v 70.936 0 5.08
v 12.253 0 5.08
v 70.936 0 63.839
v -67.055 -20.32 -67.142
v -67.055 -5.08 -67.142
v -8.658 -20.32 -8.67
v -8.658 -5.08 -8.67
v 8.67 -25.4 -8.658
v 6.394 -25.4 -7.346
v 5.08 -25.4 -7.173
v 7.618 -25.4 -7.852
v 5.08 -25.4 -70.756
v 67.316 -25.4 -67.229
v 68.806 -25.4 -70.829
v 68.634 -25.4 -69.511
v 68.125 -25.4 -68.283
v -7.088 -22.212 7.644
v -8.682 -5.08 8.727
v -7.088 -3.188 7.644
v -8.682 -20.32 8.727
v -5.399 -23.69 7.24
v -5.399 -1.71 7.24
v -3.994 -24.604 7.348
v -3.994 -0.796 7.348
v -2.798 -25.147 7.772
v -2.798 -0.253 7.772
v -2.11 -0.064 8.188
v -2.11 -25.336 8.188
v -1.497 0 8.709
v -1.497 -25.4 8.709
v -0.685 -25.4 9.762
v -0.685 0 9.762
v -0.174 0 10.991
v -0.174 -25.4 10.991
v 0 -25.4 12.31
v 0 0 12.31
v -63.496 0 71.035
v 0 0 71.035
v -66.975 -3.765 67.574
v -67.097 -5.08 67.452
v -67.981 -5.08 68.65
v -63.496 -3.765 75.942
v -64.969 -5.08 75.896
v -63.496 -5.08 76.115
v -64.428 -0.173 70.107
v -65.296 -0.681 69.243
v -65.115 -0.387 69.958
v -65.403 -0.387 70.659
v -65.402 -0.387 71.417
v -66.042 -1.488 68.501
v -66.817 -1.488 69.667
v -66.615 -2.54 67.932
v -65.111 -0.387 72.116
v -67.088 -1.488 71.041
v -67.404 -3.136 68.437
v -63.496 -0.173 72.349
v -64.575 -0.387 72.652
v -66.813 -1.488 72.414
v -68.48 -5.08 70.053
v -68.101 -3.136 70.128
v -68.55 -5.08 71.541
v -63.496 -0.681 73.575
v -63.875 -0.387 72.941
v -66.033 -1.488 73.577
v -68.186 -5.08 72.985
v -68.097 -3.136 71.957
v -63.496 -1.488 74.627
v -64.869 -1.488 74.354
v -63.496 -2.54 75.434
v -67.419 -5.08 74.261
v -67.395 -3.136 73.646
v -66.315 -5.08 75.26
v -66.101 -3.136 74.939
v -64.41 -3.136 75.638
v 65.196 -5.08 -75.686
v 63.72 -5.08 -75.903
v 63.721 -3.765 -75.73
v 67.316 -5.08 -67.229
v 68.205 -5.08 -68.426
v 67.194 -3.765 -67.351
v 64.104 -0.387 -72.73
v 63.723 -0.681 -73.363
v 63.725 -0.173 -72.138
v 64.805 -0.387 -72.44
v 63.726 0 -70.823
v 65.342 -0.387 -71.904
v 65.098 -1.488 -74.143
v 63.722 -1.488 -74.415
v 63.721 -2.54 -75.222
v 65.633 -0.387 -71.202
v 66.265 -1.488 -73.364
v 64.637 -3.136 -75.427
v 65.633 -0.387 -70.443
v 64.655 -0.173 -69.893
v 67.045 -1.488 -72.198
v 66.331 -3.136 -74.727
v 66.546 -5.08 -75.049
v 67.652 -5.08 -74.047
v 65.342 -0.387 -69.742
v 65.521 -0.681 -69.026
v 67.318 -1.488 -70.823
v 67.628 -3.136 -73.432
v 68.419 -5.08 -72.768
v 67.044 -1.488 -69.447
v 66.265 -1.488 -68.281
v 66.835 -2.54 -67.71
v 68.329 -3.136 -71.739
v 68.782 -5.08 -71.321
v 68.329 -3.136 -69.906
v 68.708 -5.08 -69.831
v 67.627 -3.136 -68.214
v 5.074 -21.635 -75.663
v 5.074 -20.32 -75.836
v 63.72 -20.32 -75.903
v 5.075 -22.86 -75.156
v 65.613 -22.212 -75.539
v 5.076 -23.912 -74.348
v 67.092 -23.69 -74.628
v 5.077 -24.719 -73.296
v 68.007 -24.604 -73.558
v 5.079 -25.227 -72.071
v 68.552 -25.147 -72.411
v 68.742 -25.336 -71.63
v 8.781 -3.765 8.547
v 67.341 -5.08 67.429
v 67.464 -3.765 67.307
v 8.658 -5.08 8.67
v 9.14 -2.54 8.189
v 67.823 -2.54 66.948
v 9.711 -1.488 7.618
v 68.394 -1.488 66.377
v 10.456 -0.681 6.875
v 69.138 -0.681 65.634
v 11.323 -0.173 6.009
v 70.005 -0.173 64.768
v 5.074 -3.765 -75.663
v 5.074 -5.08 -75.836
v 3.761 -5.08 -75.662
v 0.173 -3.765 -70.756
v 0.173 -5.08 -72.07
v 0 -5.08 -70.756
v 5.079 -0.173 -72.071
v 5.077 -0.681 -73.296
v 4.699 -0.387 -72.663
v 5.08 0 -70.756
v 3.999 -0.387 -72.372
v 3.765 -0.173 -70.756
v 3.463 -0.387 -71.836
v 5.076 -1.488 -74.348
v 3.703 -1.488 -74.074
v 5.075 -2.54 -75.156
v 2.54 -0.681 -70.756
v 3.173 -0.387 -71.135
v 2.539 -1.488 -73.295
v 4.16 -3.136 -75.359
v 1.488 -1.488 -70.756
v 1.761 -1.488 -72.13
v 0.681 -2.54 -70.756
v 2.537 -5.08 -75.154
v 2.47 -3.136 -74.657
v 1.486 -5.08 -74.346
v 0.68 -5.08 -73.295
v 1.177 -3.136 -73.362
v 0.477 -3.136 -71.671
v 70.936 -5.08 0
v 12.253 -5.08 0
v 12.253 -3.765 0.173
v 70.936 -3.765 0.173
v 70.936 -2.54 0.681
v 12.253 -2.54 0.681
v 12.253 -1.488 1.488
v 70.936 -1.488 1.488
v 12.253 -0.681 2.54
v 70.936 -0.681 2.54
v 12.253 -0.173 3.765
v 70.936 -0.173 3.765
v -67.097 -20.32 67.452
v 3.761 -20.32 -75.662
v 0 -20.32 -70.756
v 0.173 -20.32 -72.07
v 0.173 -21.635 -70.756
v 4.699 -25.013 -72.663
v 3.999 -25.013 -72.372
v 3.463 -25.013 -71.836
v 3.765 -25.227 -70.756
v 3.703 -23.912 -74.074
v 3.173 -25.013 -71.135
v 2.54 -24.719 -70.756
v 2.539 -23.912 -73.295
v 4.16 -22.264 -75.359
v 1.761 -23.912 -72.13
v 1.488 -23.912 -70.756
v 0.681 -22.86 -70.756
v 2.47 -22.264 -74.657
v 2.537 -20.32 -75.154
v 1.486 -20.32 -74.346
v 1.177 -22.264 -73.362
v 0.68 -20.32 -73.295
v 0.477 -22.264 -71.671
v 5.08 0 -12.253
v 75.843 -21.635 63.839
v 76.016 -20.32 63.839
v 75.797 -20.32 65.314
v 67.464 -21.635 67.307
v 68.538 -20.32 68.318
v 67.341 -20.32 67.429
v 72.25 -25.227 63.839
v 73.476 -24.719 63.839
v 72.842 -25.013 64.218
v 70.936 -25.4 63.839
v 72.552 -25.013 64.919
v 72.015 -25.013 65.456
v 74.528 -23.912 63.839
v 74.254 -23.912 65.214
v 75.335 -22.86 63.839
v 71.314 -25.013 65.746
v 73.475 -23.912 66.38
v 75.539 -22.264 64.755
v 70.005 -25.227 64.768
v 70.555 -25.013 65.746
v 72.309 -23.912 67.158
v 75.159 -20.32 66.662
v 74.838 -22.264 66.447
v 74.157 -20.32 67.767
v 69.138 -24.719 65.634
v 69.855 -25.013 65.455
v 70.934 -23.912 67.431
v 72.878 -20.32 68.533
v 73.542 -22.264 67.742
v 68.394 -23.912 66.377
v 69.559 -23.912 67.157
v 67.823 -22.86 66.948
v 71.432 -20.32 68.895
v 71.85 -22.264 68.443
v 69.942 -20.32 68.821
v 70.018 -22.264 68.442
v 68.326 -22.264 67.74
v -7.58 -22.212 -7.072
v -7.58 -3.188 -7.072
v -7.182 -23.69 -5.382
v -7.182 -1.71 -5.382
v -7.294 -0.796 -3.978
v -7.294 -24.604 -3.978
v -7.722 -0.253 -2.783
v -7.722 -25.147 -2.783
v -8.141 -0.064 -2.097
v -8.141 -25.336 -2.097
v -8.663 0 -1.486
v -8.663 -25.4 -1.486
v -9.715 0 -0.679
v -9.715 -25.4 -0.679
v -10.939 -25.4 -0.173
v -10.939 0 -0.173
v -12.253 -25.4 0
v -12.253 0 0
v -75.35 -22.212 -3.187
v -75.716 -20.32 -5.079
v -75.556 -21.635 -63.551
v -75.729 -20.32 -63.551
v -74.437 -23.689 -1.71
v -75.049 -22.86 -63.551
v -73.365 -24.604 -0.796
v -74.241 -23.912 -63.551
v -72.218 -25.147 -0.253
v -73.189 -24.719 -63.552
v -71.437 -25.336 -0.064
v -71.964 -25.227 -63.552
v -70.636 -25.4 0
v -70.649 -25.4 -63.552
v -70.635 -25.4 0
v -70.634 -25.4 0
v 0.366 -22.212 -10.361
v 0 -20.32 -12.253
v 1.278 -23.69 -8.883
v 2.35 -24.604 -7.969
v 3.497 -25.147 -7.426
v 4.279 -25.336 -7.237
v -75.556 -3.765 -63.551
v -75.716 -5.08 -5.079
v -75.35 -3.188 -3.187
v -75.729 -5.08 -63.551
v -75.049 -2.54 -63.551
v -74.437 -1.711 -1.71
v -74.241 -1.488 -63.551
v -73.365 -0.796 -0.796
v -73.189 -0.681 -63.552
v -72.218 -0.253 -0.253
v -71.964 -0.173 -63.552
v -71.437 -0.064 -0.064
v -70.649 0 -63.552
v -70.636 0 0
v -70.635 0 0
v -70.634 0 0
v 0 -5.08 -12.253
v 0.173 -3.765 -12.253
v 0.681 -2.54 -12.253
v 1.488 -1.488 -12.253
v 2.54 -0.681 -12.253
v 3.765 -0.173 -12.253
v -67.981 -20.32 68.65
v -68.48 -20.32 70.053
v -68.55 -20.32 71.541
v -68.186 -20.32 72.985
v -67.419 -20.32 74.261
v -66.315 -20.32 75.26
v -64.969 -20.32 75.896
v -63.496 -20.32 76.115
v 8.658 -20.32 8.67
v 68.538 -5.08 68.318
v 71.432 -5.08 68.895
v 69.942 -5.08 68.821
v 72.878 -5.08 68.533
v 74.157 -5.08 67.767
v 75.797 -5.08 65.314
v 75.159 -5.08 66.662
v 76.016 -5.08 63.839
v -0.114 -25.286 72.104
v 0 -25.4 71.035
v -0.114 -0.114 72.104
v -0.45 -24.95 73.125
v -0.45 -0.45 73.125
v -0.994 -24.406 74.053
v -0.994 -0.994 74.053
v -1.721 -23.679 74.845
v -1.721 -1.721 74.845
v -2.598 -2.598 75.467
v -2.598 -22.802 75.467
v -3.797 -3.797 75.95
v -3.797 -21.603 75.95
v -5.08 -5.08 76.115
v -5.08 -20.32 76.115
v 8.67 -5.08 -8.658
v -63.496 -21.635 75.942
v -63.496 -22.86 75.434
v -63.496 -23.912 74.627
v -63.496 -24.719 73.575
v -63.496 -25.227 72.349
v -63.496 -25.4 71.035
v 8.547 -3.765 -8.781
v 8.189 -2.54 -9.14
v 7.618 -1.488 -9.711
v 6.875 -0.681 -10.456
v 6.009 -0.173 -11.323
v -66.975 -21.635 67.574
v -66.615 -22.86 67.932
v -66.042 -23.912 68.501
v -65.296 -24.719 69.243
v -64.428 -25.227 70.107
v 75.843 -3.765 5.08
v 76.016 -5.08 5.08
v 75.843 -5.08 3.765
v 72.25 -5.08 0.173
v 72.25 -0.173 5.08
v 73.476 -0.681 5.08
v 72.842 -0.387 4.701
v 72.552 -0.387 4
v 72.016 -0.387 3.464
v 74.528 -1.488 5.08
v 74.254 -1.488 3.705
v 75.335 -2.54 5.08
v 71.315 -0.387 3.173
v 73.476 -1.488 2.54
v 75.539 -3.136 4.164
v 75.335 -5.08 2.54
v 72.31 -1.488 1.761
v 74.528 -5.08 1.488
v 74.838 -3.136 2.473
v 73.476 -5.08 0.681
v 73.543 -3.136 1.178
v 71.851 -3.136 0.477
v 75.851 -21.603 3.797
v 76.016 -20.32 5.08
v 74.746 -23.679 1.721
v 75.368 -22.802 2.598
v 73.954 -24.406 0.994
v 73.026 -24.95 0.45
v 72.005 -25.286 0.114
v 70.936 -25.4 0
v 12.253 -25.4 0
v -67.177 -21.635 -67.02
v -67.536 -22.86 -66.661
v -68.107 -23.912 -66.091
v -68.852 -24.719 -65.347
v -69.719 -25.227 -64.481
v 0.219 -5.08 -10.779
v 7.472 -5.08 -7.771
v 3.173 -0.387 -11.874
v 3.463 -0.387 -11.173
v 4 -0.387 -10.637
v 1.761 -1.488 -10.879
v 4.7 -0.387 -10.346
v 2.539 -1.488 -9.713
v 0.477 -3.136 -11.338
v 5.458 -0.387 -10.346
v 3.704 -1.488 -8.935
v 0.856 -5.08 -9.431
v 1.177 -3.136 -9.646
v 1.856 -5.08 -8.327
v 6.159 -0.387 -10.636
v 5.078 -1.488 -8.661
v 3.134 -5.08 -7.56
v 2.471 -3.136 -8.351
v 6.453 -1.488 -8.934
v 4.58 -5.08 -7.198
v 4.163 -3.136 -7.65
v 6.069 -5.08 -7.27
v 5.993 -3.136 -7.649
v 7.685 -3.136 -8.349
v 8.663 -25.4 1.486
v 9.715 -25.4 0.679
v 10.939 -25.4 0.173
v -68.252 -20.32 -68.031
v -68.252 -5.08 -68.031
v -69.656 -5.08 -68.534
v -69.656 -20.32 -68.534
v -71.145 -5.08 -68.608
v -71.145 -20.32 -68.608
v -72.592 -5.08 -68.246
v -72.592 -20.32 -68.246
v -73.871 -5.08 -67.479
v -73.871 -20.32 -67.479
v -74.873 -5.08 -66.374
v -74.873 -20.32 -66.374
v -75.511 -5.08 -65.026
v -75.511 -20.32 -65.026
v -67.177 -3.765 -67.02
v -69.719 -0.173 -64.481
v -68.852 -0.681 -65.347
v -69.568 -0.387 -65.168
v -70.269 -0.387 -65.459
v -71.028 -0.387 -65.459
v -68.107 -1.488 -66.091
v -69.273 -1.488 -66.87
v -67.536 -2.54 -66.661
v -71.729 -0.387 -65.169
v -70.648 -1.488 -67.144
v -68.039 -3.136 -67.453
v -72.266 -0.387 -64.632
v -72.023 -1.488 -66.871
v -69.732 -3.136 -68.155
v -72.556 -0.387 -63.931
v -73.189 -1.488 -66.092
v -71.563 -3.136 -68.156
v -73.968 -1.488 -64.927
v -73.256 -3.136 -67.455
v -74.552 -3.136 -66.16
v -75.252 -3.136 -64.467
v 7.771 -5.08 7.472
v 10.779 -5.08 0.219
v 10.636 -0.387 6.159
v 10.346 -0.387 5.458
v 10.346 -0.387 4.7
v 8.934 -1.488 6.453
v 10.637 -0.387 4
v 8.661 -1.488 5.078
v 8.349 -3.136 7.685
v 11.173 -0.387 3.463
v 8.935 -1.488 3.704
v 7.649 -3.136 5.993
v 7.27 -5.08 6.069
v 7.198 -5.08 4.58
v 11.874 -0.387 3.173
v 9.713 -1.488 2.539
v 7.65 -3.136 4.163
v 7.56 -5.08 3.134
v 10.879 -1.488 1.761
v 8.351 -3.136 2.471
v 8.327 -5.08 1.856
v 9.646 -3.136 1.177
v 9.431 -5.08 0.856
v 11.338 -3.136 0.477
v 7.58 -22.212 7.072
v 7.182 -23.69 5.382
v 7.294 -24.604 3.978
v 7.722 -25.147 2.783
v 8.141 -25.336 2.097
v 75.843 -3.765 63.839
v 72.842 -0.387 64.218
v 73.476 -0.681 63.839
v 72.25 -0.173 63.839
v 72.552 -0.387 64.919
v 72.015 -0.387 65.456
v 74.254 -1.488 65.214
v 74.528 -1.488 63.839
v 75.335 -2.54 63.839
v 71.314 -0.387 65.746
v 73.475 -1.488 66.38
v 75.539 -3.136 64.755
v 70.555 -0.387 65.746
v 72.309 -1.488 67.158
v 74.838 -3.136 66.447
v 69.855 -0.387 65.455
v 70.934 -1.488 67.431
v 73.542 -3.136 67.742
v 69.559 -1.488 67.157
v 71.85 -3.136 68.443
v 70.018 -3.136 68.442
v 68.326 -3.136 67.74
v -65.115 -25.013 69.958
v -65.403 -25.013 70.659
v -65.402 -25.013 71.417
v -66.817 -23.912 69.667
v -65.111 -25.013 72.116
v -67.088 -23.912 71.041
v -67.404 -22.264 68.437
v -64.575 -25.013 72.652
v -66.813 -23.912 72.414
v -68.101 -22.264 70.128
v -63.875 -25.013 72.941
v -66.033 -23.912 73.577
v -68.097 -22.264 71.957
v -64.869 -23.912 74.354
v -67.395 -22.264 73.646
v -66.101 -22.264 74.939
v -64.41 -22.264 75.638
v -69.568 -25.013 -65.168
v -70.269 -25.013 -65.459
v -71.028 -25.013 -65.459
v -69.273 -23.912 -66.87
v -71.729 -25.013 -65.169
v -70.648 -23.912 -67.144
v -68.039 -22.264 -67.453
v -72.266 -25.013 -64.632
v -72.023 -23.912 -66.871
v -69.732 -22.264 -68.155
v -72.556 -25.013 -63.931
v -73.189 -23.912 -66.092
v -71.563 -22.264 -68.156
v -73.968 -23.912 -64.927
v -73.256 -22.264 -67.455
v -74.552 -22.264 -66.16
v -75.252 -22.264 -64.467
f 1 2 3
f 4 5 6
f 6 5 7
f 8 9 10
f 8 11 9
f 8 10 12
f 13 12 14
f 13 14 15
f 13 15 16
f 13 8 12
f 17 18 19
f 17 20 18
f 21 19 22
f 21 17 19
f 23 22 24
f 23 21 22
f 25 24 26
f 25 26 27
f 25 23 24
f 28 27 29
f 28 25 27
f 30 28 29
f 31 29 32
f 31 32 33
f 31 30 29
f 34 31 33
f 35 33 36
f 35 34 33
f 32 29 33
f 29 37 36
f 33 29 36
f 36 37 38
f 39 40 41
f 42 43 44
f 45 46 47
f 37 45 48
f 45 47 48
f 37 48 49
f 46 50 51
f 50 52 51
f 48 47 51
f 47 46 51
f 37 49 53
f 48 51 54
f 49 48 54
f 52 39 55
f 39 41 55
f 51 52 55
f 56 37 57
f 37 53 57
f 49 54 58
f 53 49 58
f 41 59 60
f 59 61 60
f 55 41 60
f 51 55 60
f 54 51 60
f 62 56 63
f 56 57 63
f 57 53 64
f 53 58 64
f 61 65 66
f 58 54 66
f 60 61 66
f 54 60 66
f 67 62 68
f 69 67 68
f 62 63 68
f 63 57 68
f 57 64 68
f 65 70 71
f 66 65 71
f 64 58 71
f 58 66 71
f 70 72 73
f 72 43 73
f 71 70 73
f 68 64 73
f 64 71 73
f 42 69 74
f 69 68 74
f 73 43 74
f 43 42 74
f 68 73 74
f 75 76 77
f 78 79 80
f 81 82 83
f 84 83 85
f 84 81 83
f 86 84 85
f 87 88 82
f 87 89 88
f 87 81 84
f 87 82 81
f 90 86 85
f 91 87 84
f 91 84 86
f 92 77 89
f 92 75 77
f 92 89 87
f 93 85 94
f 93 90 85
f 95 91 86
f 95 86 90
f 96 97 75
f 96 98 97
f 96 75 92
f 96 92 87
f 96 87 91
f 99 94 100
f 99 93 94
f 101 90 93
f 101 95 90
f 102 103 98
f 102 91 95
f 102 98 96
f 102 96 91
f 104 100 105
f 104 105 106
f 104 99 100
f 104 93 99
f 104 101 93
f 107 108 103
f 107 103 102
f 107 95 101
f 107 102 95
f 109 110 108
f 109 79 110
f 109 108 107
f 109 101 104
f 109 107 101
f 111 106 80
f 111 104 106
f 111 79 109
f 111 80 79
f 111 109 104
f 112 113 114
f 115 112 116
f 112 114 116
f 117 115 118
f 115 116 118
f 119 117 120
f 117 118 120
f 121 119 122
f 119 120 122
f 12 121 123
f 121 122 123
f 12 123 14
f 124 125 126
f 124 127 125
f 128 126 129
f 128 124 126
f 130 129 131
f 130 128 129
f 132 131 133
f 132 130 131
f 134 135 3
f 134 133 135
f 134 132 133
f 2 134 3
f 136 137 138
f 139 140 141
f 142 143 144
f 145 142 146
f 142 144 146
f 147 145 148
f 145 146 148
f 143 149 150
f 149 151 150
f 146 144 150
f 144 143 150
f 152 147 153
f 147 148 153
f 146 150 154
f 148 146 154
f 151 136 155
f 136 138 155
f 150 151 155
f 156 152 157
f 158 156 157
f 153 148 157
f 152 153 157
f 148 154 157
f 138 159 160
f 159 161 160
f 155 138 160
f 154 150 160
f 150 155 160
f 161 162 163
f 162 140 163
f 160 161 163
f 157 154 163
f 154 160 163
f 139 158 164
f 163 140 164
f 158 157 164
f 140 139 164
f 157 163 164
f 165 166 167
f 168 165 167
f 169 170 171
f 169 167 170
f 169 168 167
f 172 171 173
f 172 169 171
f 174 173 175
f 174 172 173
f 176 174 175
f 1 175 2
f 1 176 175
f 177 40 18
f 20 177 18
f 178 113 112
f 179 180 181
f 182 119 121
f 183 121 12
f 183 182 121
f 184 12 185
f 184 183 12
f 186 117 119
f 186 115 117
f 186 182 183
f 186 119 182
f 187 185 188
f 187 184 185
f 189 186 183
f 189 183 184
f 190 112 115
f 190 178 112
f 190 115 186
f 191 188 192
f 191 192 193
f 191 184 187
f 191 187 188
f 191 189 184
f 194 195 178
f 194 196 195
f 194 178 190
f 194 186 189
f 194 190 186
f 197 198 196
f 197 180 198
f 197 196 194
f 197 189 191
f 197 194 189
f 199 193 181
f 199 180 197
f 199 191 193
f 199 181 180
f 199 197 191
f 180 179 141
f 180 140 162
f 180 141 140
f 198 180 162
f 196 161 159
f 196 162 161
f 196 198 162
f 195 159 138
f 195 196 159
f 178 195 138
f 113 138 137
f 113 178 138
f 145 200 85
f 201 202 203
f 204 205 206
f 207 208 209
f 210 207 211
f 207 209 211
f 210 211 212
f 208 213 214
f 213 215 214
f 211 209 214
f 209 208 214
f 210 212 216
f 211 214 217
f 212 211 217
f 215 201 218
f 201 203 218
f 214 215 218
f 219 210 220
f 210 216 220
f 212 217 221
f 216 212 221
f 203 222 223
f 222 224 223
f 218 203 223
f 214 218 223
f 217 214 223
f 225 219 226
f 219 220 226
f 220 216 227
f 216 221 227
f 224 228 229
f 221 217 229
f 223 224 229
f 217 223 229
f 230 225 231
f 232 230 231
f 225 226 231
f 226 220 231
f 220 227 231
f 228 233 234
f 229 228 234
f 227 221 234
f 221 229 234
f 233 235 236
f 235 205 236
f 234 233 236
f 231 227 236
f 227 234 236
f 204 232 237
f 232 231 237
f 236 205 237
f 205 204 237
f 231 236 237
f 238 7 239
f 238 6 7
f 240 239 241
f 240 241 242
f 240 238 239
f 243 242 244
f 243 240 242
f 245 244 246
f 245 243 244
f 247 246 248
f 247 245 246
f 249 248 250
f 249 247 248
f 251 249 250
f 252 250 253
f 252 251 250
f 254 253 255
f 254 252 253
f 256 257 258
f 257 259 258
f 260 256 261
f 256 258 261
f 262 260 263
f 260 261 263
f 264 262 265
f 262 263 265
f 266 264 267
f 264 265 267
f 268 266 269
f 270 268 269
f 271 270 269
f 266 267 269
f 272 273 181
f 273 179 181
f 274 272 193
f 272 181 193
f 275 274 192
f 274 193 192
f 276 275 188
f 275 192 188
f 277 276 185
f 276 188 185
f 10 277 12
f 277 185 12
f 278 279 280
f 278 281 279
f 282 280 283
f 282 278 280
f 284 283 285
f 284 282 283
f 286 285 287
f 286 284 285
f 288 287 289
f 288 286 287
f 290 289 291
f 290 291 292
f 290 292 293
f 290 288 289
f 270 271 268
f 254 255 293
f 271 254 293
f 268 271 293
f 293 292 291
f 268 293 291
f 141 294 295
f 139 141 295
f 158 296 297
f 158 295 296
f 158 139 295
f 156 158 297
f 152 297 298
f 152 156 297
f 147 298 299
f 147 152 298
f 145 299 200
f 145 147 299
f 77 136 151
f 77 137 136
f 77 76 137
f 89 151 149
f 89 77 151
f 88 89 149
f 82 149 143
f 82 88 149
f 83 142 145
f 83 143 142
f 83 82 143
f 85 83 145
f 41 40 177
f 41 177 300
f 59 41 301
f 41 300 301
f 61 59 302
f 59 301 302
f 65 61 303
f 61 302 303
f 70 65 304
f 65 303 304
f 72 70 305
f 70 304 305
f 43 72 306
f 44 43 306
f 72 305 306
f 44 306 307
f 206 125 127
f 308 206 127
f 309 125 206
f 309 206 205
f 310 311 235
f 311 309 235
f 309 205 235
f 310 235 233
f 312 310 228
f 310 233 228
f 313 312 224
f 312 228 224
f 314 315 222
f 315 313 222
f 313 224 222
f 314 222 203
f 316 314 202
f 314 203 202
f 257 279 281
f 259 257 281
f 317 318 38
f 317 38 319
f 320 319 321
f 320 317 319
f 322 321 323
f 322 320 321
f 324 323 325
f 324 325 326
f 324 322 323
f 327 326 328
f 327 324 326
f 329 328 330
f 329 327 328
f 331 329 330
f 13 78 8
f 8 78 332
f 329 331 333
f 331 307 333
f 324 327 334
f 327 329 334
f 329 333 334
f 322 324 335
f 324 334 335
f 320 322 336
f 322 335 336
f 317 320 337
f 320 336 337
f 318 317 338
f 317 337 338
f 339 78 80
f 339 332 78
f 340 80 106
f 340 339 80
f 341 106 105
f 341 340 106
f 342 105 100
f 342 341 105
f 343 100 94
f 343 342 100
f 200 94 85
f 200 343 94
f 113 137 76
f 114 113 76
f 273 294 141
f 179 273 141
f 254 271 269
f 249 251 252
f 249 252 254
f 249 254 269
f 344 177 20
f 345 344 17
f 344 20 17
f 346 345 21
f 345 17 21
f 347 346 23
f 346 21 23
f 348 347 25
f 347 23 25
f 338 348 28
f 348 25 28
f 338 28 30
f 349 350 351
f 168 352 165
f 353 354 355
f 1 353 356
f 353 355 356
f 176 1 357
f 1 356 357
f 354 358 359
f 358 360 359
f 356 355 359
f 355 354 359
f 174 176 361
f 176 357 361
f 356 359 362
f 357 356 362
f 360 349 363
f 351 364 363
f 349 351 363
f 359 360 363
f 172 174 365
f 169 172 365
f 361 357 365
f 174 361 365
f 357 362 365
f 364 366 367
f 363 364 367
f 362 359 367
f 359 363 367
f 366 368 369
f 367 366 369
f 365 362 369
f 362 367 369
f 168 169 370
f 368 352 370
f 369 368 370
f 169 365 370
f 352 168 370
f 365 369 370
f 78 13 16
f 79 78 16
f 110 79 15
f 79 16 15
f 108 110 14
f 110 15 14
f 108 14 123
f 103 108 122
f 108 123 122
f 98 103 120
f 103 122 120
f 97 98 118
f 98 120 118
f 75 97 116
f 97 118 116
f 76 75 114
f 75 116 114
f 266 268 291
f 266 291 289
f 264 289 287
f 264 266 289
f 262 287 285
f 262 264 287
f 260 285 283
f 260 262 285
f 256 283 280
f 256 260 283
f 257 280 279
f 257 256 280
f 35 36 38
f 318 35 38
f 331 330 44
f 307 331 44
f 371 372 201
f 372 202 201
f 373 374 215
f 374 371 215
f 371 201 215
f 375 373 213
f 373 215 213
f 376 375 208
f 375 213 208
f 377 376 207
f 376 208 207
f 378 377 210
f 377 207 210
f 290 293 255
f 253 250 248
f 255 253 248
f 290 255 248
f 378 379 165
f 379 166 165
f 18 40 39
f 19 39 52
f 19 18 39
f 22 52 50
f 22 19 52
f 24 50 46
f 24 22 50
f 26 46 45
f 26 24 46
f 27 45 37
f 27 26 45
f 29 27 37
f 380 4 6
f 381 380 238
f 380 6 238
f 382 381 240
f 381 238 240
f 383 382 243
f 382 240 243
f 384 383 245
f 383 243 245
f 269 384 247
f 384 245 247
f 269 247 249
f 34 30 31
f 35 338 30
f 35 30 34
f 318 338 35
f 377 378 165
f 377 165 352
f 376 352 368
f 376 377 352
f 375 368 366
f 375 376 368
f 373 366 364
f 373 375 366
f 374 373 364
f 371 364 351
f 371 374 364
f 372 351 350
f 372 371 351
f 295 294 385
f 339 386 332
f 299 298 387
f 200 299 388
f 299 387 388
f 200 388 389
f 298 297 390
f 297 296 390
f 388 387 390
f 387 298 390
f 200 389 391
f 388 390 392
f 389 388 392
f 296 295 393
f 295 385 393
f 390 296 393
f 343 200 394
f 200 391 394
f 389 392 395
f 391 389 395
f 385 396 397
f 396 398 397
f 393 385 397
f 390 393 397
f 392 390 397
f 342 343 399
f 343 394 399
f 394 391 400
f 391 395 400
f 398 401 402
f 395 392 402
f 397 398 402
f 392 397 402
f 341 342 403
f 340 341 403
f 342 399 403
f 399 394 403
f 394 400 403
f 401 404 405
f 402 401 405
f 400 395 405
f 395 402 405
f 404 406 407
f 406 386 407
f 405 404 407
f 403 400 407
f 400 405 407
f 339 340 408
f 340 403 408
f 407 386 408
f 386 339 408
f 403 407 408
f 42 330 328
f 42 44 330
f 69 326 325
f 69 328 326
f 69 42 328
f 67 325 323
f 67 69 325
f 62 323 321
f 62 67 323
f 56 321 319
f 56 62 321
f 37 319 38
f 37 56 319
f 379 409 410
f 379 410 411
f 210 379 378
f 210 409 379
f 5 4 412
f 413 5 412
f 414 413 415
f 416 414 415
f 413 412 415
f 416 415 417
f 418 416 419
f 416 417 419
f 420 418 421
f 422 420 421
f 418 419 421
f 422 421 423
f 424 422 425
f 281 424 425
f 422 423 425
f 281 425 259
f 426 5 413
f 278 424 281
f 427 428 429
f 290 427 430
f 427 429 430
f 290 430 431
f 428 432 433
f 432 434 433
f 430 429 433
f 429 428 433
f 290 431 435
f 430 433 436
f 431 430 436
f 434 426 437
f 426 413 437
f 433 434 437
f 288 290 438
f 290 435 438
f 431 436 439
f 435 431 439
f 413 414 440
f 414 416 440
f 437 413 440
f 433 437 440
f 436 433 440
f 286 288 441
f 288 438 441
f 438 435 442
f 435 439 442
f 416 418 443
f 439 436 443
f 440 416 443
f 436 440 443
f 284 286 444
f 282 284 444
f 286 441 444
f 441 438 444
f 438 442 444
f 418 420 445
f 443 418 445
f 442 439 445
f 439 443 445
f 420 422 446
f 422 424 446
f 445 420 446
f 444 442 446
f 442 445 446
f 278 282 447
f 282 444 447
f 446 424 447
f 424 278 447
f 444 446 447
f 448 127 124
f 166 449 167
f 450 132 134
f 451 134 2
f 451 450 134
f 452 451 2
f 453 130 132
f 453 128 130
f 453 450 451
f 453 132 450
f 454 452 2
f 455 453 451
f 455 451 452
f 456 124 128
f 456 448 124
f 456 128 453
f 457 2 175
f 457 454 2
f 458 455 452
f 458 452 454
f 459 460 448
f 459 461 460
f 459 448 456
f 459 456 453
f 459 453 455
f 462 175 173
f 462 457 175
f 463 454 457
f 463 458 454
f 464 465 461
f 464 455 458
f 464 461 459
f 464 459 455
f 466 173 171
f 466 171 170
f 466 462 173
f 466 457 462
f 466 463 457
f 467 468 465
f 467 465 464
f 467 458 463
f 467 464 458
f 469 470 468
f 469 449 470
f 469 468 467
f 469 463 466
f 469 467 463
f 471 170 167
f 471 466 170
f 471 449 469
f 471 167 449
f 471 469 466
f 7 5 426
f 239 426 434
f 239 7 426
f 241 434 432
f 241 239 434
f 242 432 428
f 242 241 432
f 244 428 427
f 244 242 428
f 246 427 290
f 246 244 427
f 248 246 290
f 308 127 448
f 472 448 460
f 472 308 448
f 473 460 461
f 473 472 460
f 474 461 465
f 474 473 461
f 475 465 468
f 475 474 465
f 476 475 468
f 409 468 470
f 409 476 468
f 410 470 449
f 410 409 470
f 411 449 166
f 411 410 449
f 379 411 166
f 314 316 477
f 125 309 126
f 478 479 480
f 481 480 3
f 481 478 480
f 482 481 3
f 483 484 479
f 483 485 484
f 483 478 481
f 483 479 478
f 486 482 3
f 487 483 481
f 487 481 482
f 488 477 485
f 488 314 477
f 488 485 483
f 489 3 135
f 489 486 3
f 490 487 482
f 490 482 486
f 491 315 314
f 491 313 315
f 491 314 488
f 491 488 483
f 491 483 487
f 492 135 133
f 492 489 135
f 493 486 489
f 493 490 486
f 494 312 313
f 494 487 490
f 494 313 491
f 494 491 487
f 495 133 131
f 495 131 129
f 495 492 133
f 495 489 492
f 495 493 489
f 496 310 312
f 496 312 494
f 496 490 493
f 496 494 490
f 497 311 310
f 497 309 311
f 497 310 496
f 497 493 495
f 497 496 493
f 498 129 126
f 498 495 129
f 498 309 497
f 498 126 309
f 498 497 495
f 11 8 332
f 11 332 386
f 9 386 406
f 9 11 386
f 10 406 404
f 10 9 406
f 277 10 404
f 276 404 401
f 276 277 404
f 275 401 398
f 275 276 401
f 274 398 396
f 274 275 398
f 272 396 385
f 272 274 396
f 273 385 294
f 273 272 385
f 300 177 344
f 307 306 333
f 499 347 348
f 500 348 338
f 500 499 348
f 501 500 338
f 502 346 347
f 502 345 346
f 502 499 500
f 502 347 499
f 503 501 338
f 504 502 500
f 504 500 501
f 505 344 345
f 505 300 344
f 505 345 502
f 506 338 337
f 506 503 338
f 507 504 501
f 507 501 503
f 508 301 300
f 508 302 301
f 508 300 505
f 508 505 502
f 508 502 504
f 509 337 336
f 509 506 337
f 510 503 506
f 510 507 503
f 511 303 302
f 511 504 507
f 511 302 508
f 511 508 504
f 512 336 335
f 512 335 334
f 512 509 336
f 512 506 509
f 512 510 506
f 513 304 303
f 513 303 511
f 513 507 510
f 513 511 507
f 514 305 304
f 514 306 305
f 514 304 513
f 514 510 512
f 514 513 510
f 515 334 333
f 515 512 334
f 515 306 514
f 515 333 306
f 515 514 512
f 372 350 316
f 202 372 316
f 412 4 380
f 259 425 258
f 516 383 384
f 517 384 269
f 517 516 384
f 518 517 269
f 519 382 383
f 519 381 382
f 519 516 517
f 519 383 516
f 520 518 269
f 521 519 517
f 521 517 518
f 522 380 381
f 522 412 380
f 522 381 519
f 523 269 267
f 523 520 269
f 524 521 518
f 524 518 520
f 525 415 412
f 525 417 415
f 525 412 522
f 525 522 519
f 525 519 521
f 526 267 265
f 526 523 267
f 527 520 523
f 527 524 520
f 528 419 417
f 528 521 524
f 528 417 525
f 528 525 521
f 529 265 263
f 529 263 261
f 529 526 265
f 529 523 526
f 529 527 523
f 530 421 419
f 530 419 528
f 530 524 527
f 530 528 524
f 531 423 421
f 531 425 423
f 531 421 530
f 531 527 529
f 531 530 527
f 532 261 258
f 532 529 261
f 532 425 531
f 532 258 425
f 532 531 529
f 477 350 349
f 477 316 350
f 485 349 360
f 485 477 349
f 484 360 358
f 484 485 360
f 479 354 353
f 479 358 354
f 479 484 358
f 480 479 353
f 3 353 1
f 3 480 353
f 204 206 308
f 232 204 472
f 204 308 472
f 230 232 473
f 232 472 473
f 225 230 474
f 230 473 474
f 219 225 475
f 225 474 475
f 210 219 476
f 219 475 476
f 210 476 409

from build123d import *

# Parameters (mm, degrees)
F1_DEPTH = 25.4
F2_R     = 5.08
F2_2_R   = 5.08
F2_3_R   = 5.08
F2_4_R   = 5.08


with BuildPart() as f1:
    # F0 (on Front) → F1 (new body)
    with BuildSketch(Plane.XZ):
        Polygon((76.0156884789, -75.9169031134), (0, 0), (0, -75.8305569174), align=None)
    extrude(amount=F1_DEPTH)

    # F2
    f2_edges = [f1.edges().sort_by_distance(p)[0] for p in [
        (0, -12.7, -75.830557),
        (76.015688, -12.7, -75.916903),
        (38.007844, 0, -75.87373),
        (38.007844, -25.4, -75.87373),
        (0, 0, -37.915278),
        (0, -25.4, -37.915278),
        (38.007844, 0, -37.958452),
        (0, -12.7, 0),
    ]]
    fillet(f2_edges, radius=F2_R)


with BuildPart() as f1b:
    # F0 (on Front) → F1, piece 2 (new body)
    with BuildSketch(Plane.XZ):
        Polygon((-75.714327395, 76.114602387), (0, 0), (0, 76.114602387), align=None)
    extrude(amount=F1_DEPTH)

    # F2#2
    f2_2_edges = [f1b.edges().sort_by_distance(p)[0] for p in [
        (-75.714327, -12.7, 76.114602),
        (-37.857164, 0, 38.057301),
        (-37.857164, -25.4, 38.057301),
        (0, -12.7, 76.114602),
        (-37.857164, 0, 76.114602),
        (-37.857164, -25.4, 76.114602),
        (0, -12.7, 0),
    ]]
    fillet(f2_2_edges, radius=F2_2_R)


with BuildPart() as f1c:
    # F0 (on Front) → F1, piece 3 (new body)
    with BuildSketch(Plane.XZ):
        Polygon((76.0156884789, 76.114602387), (0, 0), (76.0156884789, 0), align=None)
    extrude(amount=F1_DEPTH)

    # F2#3
    f2_3_edges = [f1c.edges().sort_by_distance(p)[0] for p in [
        (76.015688, -12.7, 0),
        (76.015688, -12.7, 76.114602),
        (76.015688, 0, 38.057301),
        (76.015688, -25.4, 38.057301),
        (38.007844, 0, 0),
        (0, -12.7, 0),
        (38.007844, 0, 38.057301),
        (38.007844, -25.4, 38.057301),
    ]]
    fillet(f2_3_edges, radius=F2_3_R)


with BuildPart() as f1d:
    # F0 (on Front) → F1, piece 4 (new body)
    with BuildSketch(Plane.XZ):
        Polygon((-75.7320121376, -75.8305569174), (0, 0), (-75.714327395, 0), align=None)
    extrude(amount=F1_DEPTH)

    # F2#4
    f2_4_edges = [f1d.edges().sort_by_distance(p)[0] for p in [
        (0, -12.7, 0),
        (-75.732012, -12.7, -75.830557),
        (-37.866006, 0, -37.915278),
        (-37.866006, -25.4, -37.915278),
        (-75.714327, -12.7, 0),
        (-75.72317, 0, -37.915278),
        (-75.72317, -25.4, -37.915278),
    ]]
    fillet(f2_4_edges, radius=F2_4_R)


solid = Compound([f1.part, f1b.part, f1c.part, f1d.part])
